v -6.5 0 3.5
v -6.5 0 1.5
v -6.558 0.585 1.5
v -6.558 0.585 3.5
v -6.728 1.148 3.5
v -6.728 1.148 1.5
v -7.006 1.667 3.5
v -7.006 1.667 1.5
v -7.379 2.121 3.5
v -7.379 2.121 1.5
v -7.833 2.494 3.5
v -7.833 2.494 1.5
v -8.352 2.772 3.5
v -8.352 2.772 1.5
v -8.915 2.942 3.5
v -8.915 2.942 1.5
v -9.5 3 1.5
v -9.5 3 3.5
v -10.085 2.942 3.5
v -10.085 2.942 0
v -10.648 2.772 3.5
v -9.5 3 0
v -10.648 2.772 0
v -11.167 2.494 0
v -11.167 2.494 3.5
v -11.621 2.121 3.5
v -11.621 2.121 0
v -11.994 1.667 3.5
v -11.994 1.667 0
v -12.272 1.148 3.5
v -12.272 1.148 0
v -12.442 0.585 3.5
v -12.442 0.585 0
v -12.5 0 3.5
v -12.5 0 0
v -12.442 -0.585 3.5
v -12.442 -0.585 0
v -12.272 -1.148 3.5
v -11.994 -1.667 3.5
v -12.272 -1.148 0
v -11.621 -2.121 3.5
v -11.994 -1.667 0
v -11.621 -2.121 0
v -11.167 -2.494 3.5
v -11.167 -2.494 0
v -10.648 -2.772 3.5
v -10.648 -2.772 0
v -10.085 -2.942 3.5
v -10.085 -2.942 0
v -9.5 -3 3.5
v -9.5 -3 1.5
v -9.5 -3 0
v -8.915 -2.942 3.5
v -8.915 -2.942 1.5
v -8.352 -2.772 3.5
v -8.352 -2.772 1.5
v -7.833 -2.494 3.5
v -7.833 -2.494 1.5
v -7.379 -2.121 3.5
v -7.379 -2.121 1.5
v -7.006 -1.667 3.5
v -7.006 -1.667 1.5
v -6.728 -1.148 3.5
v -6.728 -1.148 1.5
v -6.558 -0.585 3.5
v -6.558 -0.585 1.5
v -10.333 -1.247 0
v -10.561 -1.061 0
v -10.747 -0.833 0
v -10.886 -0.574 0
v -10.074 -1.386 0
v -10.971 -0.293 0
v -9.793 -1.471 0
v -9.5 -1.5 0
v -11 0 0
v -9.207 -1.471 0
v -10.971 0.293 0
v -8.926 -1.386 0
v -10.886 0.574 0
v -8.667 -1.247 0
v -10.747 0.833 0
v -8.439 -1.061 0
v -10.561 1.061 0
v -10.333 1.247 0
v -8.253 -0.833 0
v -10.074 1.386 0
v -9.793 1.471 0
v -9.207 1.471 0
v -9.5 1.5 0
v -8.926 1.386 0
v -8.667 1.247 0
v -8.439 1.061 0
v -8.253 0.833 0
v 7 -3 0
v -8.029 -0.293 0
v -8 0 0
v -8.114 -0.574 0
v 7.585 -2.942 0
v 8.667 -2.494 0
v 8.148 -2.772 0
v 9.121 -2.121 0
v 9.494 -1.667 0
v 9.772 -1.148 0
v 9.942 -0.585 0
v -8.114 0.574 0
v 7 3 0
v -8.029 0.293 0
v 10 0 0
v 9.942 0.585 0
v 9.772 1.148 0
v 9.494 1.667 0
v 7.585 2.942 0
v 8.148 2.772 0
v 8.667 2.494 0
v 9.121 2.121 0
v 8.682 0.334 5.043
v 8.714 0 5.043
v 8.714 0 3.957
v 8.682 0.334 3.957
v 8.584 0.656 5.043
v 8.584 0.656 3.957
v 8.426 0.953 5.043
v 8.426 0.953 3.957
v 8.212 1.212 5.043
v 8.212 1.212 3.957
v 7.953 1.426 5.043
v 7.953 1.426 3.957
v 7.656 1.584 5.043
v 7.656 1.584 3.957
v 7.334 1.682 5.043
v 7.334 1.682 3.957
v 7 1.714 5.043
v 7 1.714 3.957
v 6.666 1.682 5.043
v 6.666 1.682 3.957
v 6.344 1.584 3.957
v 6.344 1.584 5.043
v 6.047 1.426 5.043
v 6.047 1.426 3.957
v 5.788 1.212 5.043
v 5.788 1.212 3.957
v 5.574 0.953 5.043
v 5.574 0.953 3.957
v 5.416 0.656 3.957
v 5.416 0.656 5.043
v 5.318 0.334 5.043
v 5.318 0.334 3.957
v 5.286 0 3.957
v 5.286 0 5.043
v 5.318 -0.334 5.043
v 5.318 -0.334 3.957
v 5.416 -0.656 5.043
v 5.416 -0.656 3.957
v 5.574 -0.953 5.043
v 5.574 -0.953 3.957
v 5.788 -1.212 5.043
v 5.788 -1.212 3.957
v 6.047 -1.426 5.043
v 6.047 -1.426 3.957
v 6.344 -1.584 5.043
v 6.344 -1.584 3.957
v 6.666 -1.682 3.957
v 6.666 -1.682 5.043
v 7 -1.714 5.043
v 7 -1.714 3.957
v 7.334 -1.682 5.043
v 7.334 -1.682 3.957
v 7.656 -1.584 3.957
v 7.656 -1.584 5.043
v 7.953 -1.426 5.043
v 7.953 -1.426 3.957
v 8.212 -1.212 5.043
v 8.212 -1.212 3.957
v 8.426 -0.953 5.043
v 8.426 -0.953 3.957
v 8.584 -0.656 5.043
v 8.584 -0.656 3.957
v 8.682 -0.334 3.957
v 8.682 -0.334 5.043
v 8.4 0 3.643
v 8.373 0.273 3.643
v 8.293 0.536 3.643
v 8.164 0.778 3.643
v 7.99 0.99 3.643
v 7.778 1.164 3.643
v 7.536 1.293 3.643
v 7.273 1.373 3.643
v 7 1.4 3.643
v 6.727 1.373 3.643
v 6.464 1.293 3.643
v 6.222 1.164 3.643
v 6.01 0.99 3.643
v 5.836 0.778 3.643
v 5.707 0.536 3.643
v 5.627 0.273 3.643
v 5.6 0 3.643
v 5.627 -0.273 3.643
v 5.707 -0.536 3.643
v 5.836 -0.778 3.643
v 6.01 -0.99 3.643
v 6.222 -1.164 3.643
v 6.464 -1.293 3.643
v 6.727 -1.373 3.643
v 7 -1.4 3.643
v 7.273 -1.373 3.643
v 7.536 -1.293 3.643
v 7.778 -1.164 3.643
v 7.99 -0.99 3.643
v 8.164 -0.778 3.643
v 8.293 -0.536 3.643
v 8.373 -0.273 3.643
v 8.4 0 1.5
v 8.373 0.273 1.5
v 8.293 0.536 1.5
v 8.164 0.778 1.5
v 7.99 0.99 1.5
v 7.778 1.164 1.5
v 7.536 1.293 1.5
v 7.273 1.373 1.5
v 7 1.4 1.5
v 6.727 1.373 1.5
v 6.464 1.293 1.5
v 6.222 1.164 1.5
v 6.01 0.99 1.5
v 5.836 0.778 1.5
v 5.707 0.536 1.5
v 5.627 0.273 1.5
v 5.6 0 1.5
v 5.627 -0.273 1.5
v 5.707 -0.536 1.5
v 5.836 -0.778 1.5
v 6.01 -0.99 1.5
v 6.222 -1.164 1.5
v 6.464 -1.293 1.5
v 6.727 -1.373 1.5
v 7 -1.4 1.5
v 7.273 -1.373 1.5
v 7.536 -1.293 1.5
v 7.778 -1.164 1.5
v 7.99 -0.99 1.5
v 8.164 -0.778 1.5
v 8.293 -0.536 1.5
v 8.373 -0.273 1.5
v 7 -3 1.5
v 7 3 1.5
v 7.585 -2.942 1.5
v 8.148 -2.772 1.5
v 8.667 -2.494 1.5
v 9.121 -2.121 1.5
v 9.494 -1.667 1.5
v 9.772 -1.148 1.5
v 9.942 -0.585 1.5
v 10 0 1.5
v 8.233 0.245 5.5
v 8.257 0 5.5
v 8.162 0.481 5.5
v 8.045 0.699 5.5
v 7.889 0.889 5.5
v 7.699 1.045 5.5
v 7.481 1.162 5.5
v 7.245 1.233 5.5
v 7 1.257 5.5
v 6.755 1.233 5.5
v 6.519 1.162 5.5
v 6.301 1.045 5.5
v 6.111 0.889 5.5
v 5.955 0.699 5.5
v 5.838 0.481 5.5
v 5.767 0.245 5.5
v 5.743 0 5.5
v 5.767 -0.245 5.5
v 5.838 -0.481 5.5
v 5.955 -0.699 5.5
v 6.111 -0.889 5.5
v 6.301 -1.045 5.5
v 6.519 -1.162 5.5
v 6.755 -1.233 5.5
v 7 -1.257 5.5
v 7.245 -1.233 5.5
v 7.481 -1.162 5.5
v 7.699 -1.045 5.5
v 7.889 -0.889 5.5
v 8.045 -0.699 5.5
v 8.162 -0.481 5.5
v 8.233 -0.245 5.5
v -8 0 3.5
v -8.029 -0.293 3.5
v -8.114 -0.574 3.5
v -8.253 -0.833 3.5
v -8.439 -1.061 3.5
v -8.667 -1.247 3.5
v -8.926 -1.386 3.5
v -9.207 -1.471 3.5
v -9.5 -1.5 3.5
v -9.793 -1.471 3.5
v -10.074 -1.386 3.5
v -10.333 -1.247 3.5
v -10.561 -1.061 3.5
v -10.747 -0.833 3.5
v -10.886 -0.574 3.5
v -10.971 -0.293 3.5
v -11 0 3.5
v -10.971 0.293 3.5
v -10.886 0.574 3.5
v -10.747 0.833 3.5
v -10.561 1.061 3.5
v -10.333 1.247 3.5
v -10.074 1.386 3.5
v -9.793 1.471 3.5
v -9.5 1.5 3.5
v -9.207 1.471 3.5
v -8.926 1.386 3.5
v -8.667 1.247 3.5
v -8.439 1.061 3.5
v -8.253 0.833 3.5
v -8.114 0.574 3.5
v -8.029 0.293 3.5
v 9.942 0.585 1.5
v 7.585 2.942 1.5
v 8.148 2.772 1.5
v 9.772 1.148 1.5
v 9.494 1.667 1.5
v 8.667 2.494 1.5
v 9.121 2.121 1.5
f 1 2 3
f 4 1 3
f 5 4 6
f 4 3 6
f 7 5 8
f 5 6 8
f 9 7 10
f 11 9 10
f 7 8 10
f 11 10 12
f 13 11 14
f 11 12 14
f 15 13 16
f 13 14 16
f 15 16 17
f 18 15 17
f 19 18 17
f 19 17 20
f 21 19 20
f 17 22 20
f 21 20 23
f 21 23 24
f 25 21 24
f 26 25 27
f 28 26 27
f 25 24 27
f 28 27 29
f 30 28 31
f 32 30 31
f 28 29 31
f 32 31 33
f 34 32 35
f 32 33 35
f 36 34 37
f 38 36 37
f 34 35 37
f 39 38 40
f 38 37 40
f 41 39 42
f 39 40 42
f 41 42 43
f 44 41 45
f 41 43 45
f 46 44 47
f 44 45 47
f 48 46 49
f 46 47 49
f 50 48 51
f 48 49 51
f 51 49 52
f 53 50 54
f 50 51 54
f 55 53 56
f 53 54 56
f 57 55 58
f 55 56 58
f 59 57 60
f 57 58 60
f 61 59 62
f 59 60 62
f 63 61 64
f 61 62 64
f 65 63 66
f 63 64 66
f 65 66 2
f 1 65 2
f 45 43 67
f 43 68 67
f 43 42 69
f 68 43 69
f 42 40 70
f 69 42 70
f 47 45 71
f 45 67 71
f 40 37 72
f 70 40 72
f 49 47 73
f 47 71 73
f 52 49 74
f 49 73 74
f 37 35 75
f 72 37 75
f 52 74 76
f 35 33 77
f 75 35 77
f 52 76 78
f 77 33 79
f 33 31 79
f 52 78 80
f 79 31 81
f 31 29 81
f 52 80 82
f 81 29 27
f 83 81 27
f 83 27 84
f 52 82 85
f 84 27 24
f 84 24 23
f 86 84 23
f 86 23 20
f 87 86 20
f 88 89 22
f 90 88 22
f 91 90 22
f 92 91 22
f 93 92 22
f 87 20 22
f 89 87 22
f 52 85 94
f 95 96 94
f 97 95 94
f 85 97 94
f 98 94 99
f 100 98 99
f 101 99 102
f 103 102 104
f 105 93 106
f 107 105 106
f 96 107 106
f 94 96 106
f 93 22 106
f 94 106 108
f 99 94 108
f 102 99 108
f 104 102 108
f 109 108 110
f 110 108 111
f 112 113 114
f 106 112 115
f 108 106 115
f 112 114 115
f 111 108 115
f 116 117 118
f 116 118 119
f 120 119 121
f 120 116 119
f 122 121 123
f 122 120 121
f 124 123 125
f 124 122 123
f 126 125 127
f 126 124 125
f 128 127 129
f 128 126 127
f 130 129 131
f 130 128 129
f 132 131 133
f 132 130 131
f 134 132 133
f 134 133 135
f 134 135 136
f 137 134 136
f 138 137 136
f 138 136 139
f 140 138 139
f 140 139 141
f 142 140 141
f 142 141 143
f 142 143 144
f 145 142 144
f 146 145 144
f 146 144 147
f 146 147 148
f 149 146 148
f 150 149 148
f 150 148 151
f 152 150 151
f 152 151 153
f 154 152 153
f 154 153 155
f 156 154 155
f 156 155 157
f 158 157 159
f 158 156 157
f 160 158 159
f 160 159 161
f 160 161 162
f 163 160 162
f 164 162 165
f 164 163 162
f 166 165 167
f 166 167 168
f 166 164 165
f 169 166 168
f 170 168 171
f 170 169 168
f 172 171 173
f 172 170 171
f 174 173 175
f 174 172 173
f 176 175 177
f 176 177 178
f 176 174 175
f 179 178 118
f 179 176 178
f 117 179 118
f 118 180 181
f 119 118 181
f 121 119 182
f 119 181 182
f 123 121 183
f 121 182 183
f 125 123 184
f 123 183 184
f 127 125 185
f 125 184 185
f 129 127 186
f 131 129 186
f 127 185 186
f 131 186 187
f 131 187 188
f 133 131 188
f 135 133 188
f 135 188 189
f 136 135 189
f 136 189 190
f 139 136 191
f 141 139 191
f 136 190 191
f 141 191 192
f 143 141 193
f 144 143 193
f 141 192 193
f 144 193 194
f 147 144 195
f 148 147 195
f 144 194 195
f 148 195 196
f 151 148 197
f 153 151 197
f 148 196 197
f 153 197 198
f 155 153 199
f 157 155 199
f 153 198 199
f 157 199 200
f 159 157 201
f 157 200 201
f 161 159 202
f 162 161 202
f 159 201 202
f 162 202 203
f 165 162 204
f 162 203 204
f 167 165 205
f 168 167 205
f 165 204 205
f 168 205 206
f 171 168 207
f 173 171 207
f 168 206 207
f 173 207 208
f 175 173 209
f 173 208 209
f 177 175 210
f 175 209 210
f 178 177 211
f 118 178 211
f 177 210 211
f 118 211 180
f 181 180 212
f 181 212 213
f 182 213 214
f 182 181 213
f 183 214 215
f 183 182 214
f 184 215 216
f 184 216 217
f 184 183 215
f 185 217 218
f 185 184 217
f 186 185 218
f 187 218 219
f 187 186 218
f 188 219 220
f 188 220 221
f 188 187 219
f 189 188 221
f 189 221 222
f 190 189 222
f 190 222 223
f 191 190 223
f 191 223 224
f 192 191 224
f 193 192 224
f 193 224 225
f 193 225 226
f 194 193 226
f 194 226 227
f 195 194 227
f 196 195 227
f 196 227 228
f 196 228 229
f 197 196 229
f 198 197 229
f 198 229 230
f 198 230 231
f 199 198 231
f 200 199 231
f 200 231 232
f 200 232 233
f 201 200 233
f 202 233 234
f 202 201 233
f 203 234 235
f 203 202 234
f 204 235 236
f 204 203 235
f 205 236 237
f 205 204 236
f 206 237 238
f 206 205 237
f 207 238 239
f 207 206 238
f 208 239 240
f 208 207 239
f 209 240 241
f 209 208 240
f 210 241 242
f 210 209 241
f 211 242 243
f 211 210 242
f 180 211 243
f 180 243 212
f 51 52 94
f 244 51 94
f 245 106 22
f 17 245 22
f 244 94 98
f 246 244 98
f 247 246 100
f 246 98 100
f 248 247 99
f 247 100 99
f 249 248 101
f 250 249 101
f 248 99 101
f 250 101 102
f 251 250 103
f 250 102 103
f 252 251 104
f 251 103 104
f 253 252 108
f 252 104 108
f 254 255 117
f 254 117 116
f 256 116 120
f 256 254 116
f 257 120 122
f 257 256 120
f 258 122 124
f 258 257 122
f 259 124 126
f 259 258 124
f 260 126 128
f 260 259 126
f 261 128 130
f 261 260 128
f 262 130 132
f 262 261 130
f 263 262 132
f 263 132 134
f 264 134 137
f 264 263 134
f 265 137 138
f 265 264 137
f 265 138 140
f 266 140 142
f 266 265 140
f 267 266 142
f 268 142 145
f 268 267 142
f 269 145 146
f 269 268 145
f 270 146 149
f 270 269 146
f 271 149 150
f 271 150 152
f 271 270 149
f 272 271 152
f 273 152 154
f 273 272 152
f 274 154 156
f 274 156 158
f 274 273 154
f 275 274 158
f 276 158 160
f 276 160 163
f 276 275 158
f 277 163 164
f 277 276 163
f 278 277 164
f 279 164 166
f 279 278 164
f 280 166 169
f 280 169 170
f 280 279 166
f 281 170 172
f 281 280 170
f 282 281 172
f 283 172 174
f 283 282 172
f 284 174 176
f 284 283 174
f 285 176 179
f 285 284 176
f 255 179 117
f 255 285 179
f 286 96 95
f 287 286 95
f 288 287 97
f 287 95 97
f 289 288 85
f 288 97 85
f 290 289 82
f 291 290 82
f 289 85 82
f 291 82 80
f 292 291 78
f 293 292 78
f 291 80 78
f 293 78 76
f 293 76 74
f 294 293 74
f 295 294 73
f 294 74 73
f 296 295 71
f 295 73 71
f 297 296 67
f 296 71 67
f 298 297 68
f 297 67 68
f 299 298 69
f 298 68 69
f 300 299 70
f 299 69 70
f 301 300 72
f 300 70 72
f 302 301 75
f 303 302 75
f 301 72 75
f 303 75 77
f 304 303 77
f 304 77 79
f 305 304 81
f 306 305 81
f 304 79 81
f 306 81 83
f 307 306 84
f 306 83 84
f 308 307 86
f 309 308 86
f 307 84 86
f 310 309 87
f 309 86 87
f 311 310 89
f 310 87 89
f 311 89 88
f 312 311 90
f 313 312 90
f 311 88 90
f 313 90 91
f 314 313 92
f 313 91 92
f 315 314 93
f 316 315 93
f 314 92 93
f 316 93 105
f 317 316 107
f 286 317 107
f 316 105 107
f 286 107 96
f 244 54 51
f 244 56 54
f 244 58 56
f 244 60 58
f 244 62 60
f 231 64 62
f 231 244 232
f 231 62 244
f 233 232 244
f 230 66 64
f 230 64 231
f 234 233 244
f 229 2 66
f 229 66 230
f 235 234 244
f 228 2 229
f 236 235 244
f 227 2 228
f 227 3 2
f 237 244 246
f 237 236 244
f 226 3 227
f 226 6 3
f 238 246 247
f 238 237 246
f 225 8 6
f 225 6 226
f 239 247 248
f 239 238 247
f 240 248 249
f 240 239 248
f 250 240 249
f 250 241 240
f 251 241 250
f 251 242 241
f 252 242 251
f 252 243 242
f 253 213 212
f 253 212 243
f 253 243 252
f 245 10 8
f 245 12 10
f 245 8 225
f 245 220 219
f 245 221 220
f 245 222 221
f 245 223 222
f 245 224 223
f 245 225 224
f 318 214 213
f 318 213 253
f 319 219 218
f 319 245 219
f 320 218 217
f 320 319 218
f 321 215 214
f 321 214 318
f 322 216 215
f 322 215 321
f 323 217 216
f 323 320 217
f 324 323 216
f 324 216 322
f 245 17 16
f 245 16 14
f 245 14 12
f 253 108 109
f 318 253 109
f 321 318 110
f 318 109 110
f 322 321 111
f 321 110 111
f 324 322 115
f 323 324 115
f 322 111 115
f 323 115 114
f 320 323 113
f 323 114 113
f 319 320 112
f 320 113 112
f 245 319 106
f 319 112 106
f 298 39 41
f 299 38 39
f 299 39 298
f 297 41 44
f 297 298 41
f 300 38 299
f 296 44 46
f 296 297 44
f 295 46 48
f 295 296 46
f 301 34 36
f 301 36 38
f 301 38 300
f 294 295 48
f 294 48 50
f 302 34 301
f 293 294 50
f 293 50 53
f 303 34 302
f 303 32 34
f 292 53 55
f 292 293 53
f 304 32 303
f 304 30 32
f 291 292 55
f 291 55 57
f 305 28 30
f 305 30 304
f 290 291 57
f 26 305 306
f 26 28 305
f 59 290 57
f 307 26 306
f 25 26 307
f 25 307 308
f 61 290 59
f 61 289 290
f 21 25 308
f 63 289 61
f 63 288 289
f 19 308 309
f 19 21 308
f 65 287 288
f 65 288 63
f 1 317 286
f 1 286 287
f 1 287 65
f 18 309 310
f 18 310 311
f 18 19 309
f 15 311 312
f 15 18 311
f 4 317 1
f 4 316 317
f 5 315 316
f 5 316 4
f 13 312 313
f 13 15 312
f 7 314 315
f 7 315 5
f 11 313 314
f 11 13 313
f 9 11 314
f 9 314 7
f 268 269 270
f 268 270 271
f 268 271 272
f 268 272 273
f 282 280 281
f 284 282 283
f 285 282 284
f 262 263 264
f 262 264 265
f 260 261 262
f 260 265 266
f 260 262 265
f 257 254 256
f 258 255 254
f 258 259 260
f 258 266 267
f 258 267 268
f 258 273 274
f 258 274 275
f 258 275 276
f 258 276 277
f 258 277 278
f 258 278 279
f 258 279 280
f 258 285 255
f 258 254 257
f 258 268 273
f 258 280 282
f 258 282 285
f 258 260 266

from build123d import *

# Parameters (mm, degrees)
F1_DEPTH    = 1.5
F2_R        = 1.4
F3_DEPTH    = 4
F4_R        = 1.7145
F5_DEPTH    = 2
F6_SIZE     = 0.4572
F7_S5_R     = 1.4
F7_T6_DEPTH = 4
F8_R        = 3
F9_DEPTH    = 2
F10_DEPTH   = 25.4


# Not quite as in the source:
# - a fillet or chamfer that OpenCascade refuses, or shapes differently, is made with other operations: its cross-section is extruded or revolved along the edge and cut away or added


with BuildPart() as f1:
    # F0 (on Top) → F1 (new body)
    with BuildSketch(Plane.XY):
        with BuildLine():
            Line((-9.5, -3), (7, -3))
            ThreePointArc((7, -3), (4, 0), (7, 3))
            Line((7, 3), (-9.5, 3))
            ThreePointArc((-9.5, 3), (-7.3786796564, 2.1213203436), (-6.5, 0))
            ThreePointArc((-6.5, 0), (-7.3786796564, -2.1213203436), (-9.5, -3))
        make_face()
        with BuildLine():
            ThreePointArc((7, 3), (4, 0), (7, -3))
            ThreePointArc((7, -3), (9.1213203436, -2.1213203436), (10, 0))
            ThreePointArc((10, 0), (9.1213203436, 2.1213203436), (7, 3))
        make_face()
        with BuildLine():
            ThreePointArc((-9.5, 3), (-12.5, 0), (-9.5, -3))
            Line((-9.5, -3), (-9.5, -1.5))
            ThreePointArc((-9.5, -1.5), (-11, 0), (-9.5, 1.5))
            Line((-9.5, 1.5), (-9.5, 3))
        make_face()
        with BuildLine():
            Line((-9.5, -1.5), (-9.5, -3))
            ThreePointArc((-9.5, -3), (-7.3786796564, -2.1213203436), (-6.5, 0))
            ThreePointArc((-6.5, 0), (-7.3786796564, 2.1213203436), (-9.5, 3))
            Line((-9.5, 3), (-9.5, 1.5))
            ThreePointArc((-9.5, 1.5), (-8.4393398282, 1.0606601718), (-8, 0))
            ThreePointArc((-8, 0), (-8.4393398282, -1.0606601718), (-9.5, -1.5))
        make_face()
    extrude(amount=F1_DEPTH)

    # F2 (on face) → F3 (join)
    with BuildSketch(Plane.XY.offset(1.5)):
        with Locations((7, 0)):
            Circle(F2_R)
    extrude(amount=F3_DEPTH)

    # F4 (on face) → F5 (join)
    with BuildSketch(Plane.XY.offset(5.5)):
        with Locations((7, 0)):
            Circle(F4_R)
    extrude(amount=-F5_DEPTH)

    # F6
    f6_edges = [f1.edges().sort_by_distance(p)[0] for p in [
        (5.2855, 0, 5.5),
    ]]
    chamfer(f6_edges, length=F6_SIZE)

    # F7: chamfer of 0.4572 on 1 edges, made by hand


with BuildPart() as f7_tool2:
    # F7_s3 → F7_t4 (revolve)
    with BuildSketch(Plane.XZ):
        Polygon((8.7145, 3.9572), (8.2573, 3.5), (8.7145, 3.5), align=None)
    revolve(axis=Axis((7, 0, 3.5), (0, 0, 1)))

    # F7_s5 → F7_t6 (cut, symmetric)
    with BuildSketch(Plane.XY.offset(3.7)):
        with Locations((7, 0)):
            Circle(F7_S5_R)
    extrude(amount=F7_T6_DEPTH, both=True, mode=Mode.SUBTRACT)


with BuildPart() as f1_1:
    add(f1.part)

    # F7_t1: cut F7_tool2
    add(f7_tool2.part, mode=Mode.SUBTRACT)

    # F8 (on face) → F9 (join)
    with BuildSketch(Plane.XY.offset(1.5)):
        with Locations((-9.5, 0)):
            Circle(F8_R)
    extrude(amount=F9_DEPTH)

    # F10 (cut): a face of the model
    f10_faces = [f1_1.faces().sort_by_distance(p)[0] for p in [
        (-9.5, 0, 1.5),
    ]]
    extrude(f10_faces, amount=-F10_DEPTH, mode=Mode.SUBTRACT)


solid = f1_1.part
